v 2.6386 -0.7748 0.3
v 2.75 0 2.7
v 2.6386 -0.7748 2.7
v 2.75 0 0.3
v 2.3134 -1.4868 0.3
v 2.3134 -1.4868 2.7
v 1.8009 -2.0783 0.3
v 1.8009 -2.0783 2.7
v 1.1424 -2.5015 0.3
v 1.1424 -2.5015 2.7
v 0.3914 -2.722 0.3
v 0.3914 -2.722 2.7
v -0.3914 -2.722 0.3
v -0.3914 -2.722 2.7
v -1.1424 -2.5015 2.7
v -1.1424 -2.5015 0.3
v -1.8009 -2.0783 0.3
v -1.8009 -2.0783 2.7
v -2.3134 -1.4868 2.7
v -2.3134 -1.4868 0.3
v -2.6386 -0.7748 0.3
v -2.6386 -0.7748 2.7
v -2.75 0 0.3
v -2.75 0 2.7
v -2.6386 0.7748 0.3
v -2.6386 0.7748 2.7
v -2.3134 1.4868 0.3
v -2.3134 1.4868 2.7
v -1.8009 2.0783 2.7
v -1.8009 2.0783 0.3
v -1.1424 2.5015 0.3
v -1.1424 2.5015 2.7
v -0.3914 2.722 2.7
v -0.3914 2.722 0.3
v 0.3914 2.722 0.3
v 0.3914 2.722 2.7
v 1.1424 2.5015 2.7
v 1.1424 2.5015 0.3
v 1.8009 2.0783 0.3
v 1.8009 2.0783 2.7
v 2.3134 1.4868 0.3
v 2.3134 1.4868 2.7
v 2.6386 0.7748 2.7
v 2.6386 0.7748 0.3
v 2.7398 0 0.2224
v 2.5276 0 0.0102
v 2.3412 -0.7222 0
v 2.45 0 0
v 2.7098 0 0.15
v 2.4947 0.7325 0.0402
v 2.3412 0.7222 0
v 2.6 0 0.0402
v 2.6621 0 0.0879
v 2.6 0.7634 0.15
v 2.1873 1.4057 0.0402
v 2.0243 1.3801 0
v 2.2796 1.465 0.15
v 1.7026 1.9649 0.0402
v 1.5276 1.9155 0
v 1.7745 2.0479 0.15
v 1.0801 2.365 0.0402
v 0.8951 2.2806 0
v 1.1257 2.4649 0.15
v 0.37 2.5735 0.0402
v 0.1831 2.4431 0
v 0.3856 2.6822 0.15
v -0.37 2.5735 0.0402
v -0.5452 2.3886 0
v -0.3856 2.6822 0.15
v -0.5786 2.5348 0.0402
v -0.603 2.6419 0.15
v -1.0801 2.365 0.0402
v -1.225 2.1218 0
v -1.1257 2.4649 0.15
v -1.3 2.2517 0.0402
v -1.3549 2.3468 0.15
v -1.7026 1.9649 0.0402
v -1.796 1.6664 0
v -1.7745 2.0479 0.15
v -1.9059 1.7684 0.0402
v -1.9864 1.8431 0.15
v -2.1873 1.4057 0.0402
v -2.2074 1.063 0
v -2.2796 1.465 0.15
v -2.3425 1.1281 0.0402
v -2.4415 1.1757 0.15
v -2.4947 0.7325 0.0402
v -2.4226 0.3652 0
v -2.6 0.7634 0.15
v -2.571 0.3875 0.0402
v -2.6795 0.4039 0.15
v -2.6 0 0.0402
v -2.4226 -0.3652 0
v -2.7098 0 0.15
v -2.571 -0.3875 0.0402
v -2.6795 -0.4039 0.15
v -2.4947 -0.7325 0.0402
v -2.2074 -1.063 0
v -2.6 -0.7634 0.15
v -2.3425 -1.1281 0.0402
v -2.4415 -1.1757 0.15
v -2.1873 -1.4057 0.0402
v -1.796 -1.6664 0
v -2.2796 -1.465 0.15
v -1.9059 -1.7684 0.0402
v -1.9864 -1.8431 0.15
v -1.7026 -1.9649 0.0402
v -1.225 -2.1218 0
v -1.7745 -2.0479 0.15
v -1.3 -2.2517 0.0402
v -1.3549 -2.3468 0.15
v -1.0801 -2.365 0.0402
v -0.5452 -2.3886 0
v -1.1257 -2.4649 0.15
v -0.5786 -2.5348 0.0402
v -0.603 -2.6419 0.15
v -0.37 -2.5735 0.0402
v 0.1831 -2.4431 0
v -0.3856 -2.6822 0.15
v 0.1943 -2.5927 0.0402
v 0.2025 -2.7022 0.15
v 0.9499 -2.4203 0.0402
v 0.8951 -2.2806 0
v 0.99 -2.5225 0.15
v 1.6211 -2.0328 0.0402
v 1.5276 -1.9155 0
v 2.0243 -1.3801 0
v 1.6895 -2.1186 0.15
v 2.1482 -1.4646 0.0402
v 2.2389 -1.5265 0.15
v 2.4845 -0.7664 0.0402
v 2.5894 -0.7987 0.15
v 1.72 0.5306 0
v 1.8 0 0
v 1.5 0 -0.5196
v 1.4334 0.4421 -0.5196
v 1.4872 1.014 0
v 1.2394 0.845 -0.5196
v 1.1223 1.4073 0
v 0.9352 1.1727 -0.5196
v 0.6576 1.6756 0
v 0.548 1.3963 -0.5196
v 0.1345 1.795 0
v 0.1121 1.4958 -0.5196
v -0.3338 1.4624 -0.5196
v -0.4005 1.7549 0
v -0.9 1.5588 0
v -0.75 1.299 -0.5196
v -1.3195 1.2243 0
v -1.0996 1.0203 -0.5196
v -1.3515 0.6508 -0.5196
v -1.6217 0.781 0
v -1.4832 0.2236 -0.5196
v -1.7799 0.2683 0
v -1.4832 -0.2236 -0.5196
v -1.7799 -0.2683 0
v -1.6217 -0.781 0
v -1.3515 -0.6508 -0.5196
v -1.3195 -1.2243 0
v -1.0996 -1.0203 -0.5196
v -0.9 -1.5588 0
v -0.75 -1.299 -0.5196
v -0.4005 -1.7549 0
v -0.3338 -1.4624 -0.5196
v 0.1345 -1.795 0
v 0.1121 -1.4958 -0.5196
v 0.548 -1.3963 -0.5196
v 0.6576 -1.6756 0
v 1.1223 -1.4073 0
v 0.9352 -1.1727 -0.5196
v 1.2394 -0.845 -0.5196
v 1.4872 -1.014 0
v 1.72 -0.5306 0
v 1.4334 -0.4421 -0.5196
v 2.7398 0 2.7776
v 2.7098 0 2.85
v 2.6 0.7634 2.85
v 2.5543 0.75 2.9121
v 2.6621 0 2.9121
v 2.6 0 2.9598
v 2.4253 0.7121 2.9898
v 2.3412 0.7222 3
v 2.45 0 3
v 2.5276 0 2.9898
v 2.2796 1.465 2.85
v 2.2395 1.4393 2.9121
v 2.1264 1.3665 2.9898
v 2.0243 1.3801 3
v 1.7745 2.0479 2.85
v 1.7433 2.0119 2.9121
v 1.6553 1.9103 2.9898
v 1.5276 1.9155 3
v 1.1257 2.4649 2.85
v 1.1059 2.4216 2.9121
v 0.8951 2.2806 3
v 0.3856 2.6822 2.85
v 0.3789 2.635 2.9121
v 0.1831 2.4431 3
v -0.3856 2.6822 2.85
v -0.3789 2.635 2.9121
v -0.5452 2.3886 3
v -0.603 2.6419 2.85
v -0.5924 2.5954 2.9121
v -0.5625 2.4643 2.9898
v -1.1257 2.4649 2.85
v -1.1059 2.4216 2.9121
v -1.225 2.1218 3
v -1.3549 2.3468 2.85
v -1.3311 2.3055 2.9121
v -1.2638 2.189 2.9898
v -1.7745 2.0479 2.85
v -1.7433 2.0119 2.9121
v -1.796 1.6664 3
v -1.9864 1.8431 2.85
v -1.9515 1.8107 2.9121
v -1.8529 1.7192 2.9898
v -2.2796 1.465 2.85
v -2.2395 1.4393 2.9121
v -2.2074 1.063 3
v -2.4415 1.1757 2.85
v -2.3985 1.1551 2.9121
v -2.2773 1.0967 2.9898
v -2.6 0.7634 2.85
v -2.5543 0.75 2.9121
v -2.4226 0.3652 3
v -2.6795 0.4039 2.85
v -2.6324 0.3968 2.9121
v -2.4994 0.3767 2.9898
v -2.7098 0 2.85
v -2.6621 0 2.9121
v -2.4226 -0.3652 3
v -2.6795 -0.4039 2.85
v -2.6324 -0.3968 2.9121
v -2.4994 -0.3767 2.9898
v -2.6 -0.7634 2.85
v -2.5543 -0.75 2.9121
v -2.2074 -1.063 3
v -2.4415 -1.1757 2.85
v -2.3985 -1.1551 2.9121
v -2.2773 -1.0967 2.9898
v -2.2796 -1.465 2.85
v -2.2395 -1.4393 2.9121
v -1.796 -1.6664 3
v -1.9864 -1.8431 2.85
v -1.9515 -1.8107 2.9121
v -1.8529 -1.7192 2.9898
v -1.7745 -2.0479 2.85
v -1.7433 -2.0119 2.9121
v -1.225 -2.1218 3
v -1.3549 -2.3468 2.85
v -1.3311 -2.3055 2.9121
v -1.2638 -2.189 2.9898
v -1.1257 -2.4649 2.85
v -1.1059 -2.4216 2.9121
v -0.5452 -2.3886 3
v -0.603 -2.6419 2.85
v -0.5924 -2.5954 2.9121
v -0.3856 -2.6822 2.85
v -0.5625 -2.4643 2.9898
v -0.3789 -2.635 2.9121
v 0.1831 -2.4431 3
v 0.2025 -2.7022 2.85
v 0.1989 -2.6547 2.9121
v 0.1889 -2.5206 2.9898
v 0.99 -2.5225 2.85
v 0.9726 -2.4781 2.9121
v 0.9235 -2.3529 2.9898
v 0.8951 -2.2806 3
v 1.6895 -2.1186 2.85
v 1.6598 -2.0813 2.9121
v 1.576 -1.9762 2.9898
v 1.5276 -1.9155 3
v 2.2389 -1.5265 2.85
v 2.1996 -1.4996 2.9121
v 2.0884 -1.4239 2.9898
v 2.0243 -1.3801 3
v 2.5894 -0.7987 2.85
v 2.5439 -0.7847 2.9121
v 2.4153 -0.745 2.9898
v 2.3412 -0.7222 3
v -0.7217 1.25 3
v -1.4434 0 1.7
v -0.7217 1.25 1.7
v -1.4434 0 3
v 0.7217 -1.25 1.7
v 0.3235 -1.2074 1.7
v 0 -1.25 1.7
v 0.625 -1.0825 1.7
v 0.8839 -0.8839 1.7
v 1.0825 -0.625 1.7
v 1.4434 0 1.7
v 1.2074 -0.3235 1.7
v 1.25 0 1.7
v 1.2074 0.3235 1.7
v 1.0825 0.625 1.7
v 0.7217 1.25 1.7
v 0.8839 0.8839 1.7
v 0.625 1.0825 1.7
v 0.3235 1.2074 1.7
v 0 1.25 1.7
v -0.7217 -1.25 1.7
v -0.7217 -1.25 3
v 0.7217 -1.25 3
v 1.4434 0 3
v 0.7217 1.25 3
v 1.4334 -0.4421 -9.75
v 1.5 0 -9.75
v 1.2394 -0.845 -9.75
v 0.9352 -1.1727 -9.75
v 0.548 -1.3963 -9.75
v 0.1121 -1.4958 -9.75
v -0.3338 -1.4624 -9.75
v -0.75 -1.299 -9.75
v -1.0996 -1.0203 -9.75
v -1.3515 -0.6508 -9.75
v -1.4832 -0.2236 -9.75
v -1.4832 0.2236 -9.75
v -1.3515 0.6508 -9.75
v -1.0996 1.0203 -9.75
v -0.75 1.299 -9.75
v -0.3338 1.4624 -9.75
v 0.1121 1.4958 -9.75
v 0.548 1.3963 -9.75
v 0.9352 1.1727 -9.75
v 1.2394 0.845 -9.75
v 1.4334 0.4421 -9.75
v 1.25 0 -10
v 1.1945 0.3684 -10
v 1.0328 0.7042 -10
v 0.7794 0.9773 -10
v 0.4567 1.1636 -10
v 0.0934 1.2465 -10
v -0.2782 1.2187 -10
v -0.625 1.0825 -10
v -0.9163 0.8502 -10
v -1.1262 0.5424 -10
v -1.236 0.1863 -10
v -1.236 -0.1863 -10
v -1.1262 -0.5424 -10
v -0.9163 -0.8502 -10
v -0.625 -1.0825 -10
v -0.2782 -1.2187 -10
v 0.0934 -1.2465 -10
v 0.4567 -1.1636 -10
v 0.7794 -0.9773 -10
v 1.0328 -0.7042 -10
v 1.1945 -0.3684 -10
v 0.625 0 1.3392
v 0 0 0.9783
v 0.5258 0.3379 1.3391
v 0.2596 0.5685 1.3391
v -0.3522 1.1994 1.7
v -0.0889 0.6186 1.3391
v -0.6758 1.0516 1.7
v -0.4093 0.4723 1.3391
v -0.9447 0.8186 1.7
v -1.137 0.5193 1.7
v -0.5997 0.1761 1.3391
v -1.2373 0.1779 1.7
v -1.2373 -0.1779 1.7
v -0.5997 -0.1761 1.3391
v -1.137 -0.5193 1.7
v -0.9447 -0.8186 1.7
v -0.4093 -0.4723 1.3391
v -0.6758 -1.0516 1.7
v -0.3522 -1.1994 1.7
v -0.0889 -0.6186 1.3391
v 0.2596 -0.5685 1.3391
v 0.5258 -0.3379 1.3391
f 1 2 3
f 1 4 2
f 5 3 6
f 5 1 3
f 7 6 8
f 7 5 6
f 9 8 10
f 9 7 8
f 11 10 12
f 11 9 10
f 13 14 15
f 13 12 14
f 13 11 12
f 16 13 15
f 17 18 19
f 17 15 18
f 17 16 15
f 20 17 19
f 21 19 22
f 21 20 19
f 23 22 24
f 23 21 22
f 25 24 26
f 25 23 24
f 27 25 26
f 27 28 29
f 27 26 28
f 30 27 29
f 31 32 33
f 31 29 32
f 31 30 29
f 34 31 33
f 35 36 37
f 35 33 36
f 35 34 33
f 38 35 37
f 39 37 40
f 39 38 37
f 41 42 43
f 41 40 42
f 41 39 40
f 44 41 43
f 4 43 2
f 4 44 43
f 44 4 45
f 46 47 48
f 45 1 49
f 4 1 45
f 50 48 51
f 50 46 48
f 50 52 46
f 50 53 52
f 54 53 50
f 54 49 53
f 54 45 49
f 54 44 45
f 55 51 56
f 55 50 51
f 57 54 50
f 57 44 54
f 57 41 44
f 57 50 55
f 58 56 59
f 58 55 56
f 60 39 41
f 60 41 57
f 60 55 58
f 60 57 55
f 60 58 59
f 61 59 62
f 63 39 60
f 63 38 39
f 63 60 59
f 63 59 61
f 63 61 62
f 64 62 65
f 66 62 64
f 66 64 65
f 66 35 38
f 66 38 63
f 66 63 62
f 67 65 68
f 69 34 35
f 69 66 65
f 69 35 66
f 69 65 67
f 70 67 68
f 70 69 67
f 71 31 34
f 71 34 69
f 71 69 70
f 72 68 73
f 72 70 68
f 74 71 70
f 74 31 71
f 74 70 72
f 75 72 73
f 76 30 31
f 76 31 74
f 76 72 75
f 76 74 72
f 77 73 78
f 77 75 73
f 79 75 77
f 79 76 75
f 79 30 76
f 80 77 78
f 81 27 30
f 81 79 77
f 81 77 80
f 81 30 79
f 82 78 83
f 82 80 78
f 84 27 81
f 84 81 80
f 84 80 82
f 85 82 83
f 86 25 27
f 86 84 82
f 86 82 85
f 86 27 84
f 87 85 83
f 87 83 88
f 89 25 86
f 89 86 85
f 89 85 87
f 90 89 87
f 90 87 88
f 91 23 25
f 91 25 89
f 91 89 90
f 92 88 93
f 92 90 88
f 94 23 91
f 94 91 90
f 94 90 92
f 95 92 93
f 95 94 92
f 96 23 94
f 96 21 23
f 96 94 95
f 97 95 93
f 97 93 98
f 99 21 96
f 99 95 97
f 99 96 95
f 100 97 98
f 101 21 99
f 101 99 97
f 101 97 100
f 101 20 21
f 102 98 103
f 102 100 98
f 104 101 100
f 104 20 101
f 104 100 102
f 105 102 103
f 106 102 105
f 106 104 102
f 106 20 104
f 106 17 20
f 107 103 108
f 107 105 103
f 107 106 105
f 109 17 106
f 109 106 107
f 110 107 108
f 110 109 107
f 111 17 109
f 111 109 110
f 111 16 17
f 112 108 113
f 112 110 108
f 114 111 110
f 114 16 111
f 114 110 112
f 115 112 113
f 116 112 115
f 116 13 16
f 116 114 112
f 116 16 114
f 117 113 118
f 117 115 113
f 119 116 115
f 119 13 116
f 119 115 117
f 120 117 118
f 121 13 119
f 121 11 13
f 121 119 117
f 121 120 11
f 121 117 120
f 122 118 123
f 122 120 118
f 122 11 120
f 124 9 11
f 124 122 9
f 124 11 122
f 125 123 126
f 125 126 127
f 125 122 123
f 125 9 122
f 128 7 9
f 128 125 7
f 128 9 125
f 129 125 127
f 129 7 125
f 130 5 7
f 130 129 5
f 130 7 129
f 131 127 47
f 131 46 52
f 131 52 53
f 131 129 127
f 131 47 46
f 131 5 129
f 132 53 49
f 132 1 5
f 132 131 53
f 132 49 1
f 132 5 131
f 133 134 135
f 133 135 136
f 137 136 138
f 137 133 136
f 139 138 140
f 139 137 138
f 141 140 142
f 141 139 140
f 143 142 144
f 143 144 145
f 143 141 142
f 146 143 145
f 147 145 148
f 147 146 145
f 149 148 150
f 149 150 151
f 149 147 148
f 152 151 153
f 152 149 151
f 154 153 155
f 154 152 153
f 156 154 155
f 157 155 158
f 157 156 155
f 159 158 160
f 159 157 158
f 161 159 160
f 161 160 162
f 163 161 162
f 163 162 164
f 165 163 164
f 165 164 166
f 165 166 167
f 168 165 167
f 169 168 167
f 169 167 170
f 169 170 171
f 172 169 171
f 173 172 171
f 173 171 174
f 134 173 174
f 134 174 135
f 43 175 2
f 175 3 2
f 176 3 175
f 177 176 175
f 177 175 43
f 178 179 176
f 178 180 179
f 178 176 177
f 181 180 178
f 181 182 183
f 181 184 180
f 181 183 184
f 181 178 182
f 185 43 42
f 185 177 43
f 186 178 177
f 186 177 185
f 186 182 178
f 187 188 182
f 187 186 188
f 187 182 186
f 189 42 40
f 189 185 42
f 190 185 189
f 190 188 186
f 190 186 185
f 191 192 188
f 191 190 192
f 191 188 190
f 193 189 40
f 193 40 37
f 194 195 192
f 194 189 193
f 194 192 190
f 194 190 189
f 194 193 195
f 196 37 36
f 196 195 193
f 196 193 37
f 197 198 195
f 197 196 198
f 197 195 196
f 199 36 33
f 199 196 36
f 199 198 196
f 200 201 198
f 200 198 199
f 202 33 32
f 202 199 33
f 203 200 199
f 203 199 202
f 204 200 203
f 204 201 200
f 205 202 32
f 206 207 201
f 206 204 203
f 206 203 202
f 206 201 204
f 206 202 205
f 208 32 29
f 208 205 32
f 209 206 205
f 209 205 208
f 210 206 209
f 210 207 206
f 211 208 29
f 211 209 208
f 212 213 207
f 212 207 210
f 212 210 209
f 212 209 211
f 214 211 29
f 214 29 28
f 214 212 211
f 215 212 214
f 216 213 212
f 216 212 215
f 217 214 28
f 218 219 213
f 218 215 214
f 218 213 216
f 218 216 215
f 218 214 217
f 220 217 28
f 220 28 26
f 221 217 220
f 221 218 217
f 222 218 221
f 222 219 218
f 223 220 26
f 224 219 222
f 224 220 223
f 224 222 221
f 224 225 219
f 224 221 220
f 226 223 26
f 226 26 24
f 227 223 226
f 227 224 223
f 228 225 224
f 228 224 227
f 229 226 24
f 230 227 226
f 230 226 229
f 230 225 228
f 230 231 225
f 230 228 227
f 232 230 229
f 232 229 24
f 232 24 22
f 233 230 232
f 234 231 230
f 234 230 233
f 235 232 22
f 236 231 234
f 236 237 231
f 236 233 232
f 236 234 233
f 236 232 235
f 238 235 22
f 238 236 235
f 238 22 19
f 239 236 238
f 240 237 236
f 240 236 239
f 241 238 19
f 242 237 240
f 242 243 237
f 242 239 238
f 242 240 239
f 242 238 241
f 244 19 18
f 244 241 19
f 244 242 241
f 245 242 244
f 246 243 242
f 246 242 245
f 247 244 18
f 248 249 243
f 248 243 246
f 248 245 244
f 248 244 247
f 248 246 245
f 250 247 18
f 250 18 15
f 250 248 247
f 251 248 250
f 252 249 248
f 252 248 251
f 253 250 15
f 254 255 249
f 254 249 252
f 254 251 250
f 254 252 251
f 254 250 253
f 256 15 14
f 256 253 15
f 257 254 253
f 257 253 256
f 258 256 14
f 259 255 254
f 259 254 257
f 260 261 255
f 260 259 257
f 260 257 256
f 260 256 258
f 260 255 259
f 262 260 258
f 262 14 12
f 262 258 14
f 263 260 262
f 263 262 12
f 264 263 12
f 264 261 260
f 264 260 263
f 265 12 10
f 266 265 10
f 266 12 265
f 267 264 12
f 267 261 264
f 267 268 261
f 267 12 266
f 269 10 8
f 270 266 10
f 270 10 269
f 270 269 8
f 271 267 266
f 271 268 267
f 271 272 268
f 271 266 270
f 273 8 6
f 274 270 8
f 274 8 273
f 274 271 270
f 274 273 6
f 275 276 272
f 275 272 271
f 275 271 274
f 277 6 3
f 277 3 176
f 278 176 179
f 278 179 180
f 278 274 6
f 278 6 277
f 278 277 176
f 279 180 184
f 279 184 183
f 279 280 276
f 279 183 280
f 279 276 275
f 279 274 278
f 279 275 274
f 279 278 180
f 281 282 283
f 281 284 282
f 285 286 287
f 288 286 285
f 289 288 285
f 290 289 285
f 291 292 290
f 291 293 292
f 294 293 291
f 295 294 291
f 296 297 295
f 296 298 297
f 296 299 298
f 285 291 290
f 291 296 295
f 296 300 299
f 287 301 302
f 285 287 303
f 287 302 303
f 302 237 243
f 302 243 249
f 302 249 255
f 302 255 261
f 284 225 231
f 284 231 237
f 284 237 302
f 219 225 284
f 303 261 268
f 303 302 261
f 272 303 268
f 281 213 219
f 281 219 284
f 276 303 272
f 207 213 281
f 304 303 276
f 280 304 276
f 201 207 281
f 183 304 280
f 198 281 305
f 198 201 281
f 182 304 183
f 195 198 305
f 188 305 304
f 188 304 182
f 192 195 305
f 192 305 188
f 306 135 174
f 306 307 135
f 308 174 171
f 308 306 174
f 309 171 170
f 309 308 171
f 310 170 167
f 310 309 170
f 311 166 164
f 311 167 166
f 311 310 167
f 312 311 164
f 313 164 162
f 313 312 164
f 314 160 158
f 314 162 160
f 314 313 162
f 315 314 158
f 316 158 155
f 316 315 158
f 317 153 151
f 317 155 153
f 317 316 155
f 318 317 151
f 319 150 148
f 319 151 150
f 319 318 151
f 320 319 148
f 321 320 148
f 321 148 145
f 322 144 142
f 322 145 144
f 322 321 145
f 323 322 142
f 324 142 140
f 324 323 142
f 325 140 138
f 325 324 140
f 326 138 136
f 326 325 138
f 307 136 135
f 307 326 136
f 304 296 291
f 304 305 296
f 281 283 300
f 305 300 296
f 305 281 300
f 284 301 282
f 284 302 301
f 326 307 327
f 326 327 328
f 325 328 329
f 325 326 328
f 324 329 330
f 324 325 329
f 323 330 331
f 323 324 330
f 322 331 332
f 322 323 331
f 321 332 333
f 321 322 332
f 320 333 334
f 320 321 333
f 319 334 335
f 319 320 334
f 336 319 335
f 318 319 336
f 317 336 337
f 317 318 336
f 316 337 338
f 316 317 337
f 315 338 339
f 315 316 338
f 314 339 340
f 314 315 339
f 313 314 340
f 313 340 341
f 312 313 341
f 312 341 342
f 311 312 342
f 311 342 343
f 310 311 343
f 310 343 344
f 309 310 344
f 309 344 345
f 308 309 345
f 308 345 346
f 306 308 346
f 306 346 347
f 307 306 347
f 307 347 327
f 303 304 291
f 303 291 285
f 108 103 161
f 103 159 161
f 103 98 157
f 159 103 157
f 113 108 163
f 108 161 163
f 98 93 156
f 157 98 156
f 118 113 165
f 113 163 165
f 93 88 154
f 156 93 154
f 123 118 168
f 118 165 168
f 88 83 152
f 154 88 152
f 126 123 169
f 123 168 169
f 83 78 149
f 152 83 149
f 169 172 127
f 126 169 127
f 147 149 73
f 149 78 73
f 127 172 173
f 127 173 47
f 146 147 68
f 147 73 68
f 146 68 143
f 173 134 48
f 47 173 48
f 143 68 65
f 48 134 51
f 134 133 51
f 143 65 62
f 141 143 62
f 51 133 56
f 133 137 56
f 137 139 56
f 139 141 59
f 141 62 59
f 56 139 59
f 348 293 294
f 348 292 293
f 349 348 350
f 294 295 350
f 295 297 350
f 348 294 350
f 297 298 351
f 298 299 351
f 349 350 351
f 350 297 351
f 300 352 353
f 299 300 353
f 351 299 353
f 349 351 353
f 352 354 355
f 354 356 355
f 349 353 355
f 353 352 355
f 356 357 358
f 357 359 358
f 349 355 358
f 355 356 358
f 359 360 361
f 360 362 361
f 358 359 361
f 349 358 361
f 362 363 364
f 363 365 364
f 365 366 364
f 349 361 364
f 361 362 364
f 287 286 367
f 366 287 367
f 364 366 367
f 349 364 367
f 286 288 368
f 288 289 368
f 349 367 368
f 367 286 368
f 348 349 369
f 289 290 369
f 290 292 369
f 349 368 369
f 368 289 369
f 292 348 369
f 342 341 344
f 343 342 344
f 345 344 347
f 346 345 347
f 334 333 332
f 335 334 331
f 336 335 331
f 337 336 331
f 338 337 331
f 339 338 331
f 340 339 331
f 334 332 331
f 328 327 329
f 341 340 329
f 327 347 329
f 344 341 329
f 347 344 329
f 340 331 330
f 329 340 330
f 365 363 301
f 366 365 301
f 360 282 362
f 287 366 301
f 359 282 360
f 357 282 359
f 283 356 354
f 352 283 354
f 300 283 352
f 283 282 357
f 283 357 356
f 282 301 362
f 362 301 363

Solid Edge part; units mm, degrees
sketch "Sketch1" plane through (0, 0, 0) normal (0, -1, 0) x (1, 0, 0)
  line L0 (2.75, 3) -> (2.75, 0)
  line L1 (2.75, 0) -> (1.8, 0)
  line L2 (1.8, 0) -> (1.5, -0.5196)
  line L3 (1.5, -0.5196) -> (1.5, -10)
  line L4 (1.5, -10) -> (0, -10)
  line L5 (1.25, 1.7) -> (0, 0.9783)
  line L6 (1.25, 3) -> (1.25, 1.7)
  line L7 (2.75, 3) -> (1.25, 3)
  dimension "D1" = 1.3
  dimension "D2" = 10
  dimension "D3" = 3
revolve "RevolvedProtrusion1" add sketch "Sketch1" angle 360 about axis through (0, 0, -6) along (0, 0, 1)
cosmetic_thread "Thread1" size "M3"
chamfer "Chamfer_1" distance 0.25 angle 45 1 edges at (-1.5, 0, -10)
fillet "Round_1" radius 0.3 2 edges at (-2.75, 0, 0) (-2.75, 0, 3)
sketch "Sketch2" plane through (0, 0, 3) normal (0, 0, 1) x (0, 1, 0)
  line L0 (-1.25, 0.7217) -> (-1.25, -0.7217)
  line L1 (0, -1.4434) -> (-1.25, -0.7217)
  line L2 (1.25, -0.7217) -> (0, -1.4434)
  line L3 (1.25, 0.7217) -> (1.25, -0.7217)
  line L4 (0, 1.4434) -> (1.25, 0.7217)
  line L5 (-1.25, 0.7217) -> (0, 1.4434)
extrude "Cutout1" cut sketch "Sketch2" against normal up to vertex (1.3 mm away)
properties part number "STD-DIN912-M3x10" material "Galvanized steel"
